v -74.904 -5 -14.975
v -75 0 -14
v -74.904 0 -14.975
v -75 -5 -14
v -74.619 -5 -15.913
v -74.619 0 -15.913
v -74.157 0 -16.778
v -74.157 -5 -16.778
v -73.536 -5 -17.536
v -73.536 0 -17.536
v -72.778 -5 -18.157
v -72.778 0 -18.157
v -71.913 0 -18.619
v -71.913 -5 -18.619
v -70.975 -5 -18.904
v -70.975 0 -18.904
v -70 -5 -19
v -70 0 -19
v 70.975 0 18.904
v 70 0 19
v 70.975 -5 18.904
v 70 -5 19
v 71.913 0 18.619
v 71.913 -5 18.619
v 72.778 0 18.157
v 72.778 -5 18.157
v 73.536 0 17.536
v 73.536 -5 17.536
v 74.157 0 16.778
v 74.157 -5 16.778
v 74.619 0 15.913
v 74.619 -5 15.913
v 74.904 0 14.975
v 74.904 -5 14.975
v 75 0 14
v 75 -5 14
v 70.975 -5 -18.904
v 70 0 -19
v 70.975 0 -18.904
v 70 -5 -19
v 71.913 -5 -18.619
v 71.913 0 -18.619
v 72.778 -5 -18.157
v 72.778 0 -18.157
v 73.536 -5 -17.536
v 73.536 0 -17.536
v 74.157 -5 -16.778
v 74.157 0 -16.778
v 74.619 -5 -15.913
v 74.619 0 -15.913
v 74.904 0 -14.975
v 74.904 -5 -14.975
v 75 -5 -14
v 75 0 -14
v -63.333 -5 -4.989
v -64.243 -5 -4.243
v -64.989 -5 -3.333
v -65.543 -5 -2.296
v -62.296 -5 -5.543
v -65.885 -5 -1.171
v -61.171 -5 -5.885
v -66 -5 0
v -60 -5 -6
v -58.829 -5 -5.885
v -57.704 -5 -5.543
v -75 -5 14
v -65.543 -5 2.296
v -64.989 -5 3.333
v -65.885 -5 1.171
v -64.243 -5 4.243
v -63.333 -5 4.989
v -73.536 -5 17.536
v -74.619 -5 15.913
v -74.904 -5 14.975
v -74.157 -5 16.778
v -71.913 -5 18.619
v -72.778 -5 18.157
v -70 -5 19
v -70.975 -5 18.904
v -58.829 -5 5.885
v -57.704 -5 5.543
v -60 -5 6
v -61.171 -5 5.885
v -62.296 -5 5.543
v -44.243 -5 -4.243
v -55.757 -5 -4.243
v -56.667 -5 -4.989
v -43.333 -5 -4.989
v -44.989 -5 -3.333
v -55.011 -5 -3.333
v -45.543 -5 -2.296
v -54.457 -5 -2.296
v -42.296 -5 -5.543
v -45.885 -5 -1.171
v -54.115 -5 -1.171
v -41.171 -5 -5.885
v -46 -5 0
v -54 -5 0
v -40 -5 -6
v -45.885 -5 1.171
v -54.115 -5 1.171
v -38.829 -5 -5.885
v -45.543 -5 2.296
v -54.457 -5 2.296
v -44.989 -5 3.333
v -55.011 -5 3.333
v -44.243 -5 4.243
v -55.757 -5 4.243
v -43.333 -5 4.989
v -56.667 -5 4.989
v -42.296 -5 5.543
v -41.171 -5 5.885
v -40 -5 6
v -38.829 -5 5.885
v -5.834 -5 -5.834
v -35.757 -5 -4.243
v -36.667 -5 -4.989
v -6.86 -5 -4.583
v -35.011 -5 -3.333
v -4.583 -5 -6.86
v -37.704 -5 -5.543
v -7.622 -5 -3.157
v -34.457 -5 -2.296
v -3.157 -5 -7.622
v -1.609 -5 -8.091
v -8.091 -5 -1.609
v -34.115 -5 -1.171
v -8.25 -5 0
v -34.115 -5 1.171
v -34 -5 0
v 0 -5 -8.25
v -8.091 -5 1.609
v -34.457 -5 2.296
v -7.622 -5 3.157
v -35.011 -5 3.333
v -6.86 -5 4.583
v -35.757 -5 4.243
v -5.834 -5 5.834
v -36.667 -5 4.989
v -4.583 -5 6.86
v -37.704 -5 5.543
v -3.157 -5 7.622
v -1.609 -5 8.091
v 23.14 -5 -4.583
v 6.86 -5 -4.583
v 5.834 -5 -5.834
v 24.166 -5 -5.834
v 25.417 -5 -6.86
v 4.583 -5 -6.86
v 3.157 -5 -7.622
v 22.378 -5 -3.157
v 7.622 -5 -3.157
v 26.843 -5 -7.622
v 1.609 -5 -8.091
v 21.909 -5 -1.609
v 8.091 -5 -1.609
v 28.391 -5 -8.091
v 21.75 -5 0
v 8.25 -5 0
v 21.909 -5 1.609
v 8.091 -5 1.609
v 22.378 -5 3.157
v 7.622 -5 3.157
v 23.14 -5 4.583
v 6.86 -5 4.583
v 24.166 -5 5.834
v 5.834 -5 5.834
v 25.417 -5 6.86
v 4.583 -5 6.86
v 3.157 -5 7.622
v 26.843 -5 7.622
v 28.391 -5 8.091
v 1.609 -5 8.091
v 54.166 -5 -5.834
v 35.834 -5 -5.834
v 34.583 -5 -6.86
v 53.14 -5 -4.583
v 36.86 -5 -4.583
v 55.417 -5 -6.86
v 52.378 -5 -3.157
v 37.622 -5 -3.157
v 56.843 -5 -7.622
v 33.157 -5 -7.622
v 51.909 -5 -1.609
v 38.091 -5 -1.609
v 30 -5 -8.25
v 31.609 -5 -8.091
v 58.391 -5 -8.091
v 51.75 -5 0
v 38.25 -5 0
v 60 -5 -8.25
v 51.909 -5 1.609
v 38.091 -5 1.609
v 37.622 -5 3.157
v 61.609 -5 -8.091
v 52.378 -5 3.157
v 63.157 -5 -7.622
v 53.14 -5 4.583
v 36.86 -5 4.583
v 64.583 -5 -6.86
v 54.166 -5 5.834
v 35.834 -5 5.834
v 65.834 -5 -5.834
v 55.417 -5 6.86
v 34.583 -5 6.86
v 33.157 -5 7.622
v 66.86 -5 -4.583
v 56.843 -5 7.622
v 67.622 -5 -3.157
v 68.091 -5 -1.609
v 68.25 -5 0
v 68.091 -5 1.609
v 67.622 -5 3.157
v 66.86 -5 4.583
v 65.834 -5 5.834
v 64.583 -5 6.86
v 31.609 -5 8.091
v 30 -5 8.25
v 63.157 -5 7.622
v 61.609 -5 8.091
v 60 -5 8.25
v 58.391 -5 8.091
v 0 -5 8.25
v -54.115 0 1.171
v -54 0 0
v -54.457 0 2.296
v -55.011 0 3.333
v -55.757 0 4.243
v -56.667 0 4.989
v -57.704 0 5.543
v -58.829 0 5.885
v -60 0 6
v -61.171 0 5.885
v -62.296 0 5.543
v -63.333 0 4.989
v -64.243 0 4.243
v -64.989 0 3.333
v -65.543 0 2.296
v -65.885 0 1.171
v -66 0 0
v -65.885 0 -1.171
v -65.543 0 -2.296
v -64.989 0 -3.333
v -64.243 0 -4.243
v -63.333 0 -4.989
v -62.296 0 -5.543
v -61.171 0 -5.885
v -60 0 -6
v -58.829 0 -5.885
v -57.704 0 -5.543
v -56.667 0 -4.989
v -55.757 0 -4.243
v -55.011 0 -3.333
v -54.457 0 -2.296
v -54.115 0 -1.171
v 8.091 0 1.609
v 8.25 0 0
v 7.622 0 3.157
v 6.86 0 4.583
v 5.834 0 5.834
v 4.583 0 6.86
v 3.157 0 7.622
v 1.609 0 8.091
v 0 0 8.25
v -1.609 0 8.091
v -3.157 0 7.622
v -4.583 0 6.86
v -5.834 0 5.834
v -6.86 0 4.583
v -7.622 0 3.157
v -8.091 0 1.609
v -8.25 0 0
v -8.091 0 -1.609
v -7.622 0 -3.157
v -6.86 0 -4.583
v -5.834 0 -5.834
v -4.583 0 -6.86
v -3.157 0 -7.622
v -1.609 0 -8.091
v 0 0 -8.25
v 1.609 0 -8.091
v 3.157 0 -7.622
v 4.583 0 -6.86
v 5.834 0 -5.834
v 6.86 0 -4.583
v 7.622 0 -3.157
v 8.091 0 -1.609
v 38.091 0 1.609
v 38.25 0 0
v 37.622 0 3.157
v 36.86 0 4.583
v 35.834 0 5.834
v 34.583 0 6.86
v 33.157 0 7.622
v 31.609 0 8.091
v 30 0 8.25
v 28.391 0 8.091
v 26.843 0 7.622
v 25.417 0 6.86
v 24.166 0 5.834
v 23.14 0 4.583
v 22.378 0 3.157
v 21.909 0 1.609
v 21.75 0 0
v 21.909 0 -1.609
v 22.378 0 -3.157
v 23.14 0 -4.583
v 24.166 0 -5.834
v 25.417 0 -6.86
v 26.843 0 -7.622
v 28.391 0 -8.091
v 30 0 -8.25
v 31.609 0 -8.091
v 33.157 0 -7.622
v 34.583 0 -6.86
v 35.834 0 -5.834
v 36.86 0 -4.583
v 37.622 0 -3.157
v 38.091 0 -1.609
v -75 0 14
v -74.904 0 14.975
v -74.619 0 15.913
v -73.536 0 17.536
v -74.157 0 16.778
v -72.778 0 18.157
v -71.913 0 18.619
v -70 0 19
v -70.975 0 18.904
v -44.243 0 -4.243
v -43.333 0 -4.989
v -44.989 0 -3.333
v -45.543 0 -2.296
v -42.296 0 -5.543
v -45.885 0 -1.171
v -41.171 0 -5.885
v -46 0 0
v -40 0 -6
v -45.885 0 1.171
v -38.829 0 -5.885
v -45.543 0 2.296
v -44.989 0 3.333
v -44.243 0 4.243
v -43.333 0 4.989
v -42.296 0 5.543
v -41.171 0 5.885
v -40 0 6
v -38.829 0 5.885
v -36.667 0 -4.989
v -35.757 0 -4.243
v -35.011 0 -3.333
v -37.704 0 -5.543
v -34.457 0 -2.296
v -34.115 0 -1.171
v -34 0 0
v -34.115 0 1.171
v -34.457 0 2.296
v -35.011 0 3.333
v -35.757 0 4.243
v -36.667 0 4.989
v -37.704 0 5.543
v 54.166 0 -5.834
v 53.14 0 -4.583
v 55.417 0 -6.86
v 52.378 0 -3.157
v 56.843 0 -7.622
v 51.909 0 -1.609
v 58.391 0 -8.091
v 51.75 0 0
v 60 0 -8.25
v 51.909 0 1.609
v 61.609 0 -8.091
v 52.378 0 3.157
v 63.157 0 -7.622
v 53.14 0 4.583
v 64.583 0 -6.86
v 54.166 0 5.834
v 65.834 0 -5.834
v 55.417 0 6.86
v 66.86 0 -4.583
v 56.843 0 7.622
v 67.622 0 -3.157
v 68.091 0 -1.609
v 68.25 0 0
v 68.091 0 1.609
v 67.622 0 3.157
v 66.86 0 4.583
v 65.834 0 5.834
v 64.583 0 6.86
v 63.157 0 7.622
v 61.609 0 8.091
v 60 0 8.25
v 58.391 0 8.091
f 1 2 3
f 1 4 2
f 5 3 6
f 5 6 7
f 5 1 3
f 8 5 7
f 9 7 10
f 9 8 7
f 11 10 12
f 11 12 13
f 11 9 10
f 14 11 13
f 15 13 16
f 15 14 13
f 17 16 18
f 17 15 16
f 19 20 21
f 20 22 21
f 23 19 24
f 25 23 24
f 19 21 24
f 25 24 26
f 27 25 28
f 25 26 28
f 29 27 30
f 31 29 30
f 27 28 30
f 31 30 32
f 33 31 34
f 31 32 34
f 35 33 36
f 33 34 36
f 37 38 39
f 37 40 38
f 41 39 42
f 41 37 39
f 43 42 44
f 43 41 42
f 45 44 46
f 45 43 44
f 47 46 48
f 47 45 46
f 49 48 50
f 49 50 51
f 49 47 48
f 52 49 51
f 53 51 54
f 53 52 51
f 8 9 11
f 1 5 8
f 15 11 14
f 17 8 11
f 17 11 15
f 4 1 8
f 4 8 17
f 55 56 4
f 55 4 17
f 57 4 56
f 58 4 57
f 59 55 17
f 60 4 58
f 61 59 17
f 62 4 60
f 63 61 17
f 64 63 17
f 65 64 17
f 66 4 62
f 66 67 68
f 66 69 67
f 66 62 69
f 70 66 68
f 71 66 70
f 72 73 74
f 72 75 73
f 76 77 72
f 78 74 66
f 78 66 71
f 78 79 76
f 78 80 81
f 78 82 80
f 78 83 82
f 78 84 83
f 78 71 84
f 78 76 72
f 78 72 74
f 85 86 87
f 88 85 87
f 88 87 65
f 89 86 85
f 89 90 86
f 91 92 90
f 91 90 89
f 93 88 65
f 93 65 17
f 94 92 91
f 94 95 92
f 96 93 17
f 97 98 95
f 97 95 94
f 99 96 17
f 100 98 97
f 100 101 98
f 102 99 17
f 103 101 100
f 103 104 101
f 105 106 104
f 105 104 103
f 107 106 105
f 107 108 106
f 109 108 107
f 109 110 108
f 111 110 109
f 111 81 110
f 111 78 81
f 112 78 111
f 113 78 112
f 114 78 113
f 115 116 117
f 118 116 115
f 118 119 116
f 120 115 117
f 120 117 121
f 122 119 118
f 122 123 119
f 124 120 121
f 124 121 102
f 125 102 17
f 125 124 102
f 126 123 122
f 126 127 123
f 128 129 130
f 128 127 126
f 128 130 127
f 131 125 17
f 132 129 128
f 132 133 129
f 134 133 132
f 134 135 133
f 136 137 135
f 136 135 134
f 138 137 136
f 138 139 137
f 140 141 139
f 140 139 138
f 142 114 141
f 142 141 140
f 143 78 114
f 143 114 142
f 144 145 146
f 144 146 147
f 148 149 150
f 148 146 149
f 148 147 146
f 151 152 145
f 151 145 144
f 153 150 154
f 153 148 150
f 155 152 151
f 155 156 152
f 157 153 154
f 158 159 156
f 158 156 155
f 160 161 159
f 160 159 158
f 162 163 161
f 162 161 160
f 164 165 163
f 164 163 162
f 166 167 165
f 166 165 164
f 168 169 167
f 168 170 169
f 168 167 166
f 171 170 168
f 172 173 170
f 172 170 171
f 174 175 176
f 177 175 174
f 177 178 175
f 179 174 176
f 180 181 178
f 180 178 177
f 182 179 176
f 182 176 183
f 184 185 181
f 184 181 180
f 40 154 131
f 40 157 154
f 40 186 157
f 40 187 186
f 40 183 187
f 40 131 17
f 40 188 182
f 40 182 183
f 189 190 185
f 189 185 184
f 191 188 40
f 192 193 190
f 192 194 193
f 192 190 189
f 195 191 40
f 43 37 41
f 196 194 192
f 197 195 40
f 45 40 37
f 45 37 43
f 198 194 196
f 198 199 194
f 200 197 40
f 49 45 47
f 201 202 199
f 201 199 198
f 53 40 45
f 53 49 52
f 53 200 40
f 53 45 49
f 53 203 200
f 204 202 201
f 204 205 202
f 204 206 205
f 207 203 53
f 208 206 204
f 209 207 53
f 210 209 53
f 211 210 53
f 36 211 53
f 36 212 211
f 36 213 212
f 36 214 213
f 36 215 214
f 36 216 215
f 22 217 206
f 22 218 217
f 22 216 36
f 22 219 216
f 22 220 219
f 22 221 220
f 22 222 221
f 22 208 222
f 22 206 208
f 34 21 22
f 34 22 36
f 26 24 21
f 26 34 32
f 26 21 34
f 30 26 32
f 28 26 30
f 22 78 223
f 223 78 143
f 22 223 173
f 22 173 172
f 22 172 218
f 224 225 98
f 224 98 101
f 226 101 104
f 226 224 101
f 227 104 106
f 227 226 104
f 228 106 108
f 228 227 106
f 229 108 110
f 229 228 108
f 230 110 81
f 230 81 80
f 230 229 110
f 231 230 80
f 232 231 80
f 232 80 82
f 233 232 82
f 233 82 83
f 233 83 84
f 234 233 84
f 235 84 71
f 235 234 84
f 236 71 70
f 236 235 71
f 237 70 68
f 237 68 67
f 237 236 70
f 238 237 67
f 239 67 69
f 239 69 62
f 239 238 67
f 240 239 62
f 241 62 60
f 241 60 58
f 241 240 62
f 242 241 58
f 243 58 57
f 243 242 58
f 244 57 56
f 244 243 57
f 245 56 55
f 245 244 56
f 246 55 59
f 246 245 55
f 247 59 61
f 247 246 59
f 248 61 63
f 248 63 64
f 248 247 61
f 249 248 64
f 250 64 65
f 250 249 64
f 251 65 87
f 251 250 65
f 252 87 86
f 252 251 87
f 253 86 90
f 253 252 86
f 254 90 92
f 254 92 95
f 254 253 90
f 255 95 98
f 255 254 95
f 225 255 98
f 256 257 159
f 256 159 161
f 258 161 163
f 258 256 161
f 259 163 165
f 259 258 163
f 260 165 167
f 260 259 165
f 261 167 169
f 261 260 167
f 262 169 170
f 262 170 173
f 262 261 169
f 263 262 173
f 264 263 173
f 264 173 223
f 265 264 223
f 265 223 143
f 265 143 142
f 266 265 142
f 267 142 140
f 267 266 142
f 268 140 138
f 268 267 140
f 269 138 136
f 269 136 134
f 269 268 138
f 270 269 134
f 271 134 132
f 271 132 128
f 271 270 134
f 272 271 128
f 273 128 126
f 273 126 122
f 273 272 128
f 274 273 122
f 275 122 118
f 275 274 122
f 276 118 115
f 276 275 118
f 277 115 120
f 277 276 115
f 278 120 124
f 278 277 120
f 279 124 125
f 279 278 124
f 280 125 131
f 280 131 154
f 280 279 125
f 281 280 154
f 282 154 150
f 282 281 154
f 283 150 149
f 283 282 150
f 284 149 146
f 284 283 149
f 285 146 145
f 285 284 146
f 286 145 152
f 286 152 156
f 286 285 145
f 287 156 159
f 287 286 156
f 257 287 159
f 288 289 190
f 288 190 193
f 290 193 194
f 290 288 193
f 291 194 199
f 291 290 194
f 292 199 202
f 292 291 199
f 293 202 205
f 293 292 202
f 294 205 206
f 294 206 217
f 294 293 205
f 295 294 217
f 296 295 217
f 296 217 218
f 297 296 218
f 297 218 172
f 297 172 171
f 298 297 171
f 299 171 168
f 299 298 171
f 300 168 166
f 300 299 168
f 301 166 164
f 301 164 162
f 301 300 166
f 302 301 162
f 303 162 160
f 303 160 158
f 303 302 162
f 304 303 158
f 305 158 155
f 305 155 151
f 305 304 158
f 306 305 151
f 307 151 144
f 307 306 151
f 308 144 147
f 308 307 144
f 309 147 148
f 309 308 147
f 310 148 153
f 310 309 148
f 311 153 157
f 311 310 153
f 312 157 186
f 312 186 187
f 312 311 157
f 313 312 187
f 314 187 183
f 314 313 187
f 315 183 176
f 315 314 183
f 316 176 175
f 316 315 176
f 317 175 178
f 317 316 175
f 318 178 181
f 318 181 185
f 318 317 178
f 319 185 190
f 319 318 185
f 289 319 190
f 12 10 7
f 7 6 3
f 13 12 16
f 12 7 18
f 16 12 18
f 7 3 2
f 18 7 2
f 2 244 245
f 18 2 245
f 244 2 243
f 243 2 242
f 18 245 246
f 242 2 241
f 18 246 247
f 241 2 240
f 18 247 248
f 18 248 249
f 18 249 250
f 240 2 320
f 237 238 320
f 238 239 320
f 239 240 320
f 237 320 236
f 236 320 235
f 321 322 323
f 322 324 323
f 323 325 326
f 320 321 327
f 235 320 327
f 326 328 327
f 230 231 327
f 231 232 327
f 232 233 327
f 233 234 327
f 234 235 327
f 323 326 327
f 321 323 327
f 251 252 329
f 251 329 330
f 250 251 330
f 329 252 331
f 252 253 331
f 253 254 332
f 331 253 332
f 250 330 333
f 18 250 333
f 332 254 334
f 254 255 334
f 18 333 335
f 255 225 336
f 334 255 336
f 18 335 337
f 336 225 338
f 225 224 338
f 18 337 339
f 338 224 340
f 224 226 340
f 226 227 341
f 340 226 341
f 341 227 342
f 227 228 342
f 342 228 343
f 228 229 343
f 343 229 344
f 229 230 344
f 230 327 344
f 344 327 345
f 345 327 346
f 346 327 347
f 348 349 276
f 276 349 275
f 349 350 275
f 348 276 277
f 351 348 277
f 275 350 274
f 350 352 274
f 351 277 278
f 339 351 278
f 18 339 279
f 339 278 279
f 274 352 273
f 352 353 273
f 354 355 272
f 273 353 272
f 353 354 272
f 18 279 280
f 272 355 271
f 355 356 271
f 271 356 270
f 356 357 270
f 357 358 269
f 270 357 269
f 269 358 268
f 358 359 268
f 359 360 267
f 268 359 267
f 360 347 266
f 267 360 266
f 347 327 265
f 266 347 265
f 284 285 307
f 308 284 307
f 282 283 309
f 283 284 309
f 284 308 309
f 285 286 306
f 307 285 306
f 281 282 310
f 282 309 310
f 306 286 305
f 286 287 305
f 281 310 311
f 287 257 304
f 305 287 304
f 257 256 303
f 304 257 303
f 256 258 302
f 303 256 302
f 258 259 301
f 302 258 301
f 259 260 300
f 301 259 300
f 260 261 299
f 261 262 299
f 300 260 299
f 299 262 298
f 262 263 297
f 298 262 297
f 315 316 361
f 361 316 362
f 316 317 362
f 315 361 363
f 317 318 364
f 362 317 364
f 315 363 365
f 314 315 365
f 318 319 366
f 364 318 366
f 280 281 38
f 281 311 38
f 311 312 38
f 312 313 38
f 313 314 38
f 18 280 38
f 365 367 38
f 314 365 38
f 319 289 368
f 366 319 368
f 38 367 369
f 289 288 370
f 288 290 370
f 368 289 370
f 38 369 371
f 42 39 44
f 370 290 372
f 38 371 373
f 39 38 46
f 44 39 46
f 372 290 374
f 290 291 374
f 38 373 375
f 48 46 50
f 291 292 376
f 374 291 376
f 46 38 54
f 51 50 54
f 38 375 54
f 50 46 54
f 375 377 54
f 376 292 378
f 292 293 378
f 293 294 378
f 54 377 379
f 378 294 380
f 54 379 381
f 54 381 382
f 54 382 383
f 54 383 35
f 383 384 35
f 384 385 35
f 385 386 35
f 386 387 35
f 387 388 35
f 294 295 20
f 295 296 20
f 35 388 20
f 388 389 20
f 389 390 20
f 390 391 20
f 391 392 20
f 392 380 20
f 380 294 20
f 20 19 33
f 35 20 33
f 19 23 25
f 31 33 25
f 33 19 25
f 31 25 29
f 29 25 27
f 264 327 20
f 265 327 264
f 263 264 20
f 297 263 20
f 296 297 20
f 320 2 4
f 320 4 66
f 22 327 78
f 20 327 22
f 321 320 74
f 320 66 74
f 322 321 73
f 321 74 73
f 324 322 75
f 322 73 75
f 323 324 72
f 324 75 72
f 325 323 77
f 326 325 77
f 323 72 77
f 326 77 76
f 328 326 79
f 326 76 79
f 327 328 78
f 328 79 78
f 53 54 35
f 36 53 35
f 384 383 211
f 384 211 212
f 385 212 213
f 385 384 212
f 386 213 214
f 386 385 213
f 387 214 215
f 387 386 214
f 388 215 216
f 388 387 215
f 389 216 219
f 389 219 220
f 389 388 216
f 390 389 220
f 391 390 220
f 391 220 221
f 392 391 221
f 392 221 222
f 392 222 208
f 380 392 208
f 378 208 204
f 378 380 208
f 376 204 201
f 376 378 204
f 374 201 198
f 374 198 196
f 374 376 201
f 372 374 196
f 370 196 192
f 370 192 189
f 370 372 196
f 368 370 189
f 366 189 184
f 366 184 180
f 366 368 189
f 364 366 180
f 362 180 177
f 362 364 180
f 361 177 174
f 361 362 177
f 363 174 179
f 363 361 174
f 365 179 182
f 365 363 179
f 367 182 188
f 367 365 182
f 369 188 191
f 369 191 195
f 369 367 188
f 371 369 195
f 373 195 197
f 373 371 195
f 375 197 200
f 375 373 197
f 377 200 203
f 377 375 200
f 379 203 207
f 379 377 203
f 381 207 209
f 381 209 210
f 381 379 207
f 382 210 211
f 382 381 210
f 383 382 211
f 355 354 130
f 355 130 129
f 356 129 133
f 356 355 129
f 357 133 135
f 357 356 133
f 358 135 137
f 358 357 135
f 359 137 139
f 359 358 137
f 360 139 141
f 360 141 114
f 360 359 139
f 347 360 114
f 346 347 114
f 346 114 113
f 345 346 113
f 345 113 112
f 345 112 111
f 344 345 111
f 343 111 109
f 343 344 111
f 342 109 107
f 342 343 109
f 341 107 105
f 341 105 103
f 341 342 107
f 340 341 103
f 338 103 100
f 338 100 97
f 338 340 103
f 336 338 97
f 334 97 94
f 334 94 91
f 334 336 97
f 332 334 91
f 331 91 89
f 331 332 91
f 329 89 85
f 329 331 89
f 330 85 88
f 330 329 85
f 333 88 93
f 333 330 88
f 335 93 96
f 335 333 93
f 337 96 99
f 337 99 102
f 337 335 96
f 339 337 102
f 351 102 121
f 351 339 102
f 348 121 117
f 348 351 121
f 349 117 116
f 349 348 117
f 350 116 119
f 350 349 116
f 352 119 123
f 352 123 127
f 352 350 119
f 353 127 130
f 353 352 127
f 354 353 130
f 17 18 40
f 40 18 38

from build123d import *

# Parameters (mm, degrees)
F0_W     = 150
F0_H     = 38
F0_R     = 6
F0_R_2   = 8.25
F1_DEPTH = 5
F2_R     = 5


with BuildPart() as f1:
    # F0 (on Front) → F1 (new body)
    with BuildSketch(Plane.XZ):
        Rectangle(F0_W, F0_H)
        with Locations((-60, 0)):
            Circle(F0_R, mode=Mode.SUBTRACT)
        with Locations((-40, 0)):
            Circle(F0_R, mode=Mode.SUBTRACT)
        Circle(F0_R_2, mode=Mode.SUBTRACT)
        with Locations((30, 0)):
            Circle(F0_R_2, mode=Mode.SUBTRACT)
        with Locations((60, 0)):
            Circle(F0_R_2, mode=Mode.SUBTRACT)
    extrude(amount=F1_DEPTH)

    # F2
    f2_edges = [f1.edges().sort_by_distance(p)[0] for p in [
        (-75, -2.5, 19),
        (-75, -2.5, -19),
        (75, -2.5, 19),
        (75, -2.5, -19),
    ]]
    fillet(f2_edges, radius=F2_R)


solid = f1.part
